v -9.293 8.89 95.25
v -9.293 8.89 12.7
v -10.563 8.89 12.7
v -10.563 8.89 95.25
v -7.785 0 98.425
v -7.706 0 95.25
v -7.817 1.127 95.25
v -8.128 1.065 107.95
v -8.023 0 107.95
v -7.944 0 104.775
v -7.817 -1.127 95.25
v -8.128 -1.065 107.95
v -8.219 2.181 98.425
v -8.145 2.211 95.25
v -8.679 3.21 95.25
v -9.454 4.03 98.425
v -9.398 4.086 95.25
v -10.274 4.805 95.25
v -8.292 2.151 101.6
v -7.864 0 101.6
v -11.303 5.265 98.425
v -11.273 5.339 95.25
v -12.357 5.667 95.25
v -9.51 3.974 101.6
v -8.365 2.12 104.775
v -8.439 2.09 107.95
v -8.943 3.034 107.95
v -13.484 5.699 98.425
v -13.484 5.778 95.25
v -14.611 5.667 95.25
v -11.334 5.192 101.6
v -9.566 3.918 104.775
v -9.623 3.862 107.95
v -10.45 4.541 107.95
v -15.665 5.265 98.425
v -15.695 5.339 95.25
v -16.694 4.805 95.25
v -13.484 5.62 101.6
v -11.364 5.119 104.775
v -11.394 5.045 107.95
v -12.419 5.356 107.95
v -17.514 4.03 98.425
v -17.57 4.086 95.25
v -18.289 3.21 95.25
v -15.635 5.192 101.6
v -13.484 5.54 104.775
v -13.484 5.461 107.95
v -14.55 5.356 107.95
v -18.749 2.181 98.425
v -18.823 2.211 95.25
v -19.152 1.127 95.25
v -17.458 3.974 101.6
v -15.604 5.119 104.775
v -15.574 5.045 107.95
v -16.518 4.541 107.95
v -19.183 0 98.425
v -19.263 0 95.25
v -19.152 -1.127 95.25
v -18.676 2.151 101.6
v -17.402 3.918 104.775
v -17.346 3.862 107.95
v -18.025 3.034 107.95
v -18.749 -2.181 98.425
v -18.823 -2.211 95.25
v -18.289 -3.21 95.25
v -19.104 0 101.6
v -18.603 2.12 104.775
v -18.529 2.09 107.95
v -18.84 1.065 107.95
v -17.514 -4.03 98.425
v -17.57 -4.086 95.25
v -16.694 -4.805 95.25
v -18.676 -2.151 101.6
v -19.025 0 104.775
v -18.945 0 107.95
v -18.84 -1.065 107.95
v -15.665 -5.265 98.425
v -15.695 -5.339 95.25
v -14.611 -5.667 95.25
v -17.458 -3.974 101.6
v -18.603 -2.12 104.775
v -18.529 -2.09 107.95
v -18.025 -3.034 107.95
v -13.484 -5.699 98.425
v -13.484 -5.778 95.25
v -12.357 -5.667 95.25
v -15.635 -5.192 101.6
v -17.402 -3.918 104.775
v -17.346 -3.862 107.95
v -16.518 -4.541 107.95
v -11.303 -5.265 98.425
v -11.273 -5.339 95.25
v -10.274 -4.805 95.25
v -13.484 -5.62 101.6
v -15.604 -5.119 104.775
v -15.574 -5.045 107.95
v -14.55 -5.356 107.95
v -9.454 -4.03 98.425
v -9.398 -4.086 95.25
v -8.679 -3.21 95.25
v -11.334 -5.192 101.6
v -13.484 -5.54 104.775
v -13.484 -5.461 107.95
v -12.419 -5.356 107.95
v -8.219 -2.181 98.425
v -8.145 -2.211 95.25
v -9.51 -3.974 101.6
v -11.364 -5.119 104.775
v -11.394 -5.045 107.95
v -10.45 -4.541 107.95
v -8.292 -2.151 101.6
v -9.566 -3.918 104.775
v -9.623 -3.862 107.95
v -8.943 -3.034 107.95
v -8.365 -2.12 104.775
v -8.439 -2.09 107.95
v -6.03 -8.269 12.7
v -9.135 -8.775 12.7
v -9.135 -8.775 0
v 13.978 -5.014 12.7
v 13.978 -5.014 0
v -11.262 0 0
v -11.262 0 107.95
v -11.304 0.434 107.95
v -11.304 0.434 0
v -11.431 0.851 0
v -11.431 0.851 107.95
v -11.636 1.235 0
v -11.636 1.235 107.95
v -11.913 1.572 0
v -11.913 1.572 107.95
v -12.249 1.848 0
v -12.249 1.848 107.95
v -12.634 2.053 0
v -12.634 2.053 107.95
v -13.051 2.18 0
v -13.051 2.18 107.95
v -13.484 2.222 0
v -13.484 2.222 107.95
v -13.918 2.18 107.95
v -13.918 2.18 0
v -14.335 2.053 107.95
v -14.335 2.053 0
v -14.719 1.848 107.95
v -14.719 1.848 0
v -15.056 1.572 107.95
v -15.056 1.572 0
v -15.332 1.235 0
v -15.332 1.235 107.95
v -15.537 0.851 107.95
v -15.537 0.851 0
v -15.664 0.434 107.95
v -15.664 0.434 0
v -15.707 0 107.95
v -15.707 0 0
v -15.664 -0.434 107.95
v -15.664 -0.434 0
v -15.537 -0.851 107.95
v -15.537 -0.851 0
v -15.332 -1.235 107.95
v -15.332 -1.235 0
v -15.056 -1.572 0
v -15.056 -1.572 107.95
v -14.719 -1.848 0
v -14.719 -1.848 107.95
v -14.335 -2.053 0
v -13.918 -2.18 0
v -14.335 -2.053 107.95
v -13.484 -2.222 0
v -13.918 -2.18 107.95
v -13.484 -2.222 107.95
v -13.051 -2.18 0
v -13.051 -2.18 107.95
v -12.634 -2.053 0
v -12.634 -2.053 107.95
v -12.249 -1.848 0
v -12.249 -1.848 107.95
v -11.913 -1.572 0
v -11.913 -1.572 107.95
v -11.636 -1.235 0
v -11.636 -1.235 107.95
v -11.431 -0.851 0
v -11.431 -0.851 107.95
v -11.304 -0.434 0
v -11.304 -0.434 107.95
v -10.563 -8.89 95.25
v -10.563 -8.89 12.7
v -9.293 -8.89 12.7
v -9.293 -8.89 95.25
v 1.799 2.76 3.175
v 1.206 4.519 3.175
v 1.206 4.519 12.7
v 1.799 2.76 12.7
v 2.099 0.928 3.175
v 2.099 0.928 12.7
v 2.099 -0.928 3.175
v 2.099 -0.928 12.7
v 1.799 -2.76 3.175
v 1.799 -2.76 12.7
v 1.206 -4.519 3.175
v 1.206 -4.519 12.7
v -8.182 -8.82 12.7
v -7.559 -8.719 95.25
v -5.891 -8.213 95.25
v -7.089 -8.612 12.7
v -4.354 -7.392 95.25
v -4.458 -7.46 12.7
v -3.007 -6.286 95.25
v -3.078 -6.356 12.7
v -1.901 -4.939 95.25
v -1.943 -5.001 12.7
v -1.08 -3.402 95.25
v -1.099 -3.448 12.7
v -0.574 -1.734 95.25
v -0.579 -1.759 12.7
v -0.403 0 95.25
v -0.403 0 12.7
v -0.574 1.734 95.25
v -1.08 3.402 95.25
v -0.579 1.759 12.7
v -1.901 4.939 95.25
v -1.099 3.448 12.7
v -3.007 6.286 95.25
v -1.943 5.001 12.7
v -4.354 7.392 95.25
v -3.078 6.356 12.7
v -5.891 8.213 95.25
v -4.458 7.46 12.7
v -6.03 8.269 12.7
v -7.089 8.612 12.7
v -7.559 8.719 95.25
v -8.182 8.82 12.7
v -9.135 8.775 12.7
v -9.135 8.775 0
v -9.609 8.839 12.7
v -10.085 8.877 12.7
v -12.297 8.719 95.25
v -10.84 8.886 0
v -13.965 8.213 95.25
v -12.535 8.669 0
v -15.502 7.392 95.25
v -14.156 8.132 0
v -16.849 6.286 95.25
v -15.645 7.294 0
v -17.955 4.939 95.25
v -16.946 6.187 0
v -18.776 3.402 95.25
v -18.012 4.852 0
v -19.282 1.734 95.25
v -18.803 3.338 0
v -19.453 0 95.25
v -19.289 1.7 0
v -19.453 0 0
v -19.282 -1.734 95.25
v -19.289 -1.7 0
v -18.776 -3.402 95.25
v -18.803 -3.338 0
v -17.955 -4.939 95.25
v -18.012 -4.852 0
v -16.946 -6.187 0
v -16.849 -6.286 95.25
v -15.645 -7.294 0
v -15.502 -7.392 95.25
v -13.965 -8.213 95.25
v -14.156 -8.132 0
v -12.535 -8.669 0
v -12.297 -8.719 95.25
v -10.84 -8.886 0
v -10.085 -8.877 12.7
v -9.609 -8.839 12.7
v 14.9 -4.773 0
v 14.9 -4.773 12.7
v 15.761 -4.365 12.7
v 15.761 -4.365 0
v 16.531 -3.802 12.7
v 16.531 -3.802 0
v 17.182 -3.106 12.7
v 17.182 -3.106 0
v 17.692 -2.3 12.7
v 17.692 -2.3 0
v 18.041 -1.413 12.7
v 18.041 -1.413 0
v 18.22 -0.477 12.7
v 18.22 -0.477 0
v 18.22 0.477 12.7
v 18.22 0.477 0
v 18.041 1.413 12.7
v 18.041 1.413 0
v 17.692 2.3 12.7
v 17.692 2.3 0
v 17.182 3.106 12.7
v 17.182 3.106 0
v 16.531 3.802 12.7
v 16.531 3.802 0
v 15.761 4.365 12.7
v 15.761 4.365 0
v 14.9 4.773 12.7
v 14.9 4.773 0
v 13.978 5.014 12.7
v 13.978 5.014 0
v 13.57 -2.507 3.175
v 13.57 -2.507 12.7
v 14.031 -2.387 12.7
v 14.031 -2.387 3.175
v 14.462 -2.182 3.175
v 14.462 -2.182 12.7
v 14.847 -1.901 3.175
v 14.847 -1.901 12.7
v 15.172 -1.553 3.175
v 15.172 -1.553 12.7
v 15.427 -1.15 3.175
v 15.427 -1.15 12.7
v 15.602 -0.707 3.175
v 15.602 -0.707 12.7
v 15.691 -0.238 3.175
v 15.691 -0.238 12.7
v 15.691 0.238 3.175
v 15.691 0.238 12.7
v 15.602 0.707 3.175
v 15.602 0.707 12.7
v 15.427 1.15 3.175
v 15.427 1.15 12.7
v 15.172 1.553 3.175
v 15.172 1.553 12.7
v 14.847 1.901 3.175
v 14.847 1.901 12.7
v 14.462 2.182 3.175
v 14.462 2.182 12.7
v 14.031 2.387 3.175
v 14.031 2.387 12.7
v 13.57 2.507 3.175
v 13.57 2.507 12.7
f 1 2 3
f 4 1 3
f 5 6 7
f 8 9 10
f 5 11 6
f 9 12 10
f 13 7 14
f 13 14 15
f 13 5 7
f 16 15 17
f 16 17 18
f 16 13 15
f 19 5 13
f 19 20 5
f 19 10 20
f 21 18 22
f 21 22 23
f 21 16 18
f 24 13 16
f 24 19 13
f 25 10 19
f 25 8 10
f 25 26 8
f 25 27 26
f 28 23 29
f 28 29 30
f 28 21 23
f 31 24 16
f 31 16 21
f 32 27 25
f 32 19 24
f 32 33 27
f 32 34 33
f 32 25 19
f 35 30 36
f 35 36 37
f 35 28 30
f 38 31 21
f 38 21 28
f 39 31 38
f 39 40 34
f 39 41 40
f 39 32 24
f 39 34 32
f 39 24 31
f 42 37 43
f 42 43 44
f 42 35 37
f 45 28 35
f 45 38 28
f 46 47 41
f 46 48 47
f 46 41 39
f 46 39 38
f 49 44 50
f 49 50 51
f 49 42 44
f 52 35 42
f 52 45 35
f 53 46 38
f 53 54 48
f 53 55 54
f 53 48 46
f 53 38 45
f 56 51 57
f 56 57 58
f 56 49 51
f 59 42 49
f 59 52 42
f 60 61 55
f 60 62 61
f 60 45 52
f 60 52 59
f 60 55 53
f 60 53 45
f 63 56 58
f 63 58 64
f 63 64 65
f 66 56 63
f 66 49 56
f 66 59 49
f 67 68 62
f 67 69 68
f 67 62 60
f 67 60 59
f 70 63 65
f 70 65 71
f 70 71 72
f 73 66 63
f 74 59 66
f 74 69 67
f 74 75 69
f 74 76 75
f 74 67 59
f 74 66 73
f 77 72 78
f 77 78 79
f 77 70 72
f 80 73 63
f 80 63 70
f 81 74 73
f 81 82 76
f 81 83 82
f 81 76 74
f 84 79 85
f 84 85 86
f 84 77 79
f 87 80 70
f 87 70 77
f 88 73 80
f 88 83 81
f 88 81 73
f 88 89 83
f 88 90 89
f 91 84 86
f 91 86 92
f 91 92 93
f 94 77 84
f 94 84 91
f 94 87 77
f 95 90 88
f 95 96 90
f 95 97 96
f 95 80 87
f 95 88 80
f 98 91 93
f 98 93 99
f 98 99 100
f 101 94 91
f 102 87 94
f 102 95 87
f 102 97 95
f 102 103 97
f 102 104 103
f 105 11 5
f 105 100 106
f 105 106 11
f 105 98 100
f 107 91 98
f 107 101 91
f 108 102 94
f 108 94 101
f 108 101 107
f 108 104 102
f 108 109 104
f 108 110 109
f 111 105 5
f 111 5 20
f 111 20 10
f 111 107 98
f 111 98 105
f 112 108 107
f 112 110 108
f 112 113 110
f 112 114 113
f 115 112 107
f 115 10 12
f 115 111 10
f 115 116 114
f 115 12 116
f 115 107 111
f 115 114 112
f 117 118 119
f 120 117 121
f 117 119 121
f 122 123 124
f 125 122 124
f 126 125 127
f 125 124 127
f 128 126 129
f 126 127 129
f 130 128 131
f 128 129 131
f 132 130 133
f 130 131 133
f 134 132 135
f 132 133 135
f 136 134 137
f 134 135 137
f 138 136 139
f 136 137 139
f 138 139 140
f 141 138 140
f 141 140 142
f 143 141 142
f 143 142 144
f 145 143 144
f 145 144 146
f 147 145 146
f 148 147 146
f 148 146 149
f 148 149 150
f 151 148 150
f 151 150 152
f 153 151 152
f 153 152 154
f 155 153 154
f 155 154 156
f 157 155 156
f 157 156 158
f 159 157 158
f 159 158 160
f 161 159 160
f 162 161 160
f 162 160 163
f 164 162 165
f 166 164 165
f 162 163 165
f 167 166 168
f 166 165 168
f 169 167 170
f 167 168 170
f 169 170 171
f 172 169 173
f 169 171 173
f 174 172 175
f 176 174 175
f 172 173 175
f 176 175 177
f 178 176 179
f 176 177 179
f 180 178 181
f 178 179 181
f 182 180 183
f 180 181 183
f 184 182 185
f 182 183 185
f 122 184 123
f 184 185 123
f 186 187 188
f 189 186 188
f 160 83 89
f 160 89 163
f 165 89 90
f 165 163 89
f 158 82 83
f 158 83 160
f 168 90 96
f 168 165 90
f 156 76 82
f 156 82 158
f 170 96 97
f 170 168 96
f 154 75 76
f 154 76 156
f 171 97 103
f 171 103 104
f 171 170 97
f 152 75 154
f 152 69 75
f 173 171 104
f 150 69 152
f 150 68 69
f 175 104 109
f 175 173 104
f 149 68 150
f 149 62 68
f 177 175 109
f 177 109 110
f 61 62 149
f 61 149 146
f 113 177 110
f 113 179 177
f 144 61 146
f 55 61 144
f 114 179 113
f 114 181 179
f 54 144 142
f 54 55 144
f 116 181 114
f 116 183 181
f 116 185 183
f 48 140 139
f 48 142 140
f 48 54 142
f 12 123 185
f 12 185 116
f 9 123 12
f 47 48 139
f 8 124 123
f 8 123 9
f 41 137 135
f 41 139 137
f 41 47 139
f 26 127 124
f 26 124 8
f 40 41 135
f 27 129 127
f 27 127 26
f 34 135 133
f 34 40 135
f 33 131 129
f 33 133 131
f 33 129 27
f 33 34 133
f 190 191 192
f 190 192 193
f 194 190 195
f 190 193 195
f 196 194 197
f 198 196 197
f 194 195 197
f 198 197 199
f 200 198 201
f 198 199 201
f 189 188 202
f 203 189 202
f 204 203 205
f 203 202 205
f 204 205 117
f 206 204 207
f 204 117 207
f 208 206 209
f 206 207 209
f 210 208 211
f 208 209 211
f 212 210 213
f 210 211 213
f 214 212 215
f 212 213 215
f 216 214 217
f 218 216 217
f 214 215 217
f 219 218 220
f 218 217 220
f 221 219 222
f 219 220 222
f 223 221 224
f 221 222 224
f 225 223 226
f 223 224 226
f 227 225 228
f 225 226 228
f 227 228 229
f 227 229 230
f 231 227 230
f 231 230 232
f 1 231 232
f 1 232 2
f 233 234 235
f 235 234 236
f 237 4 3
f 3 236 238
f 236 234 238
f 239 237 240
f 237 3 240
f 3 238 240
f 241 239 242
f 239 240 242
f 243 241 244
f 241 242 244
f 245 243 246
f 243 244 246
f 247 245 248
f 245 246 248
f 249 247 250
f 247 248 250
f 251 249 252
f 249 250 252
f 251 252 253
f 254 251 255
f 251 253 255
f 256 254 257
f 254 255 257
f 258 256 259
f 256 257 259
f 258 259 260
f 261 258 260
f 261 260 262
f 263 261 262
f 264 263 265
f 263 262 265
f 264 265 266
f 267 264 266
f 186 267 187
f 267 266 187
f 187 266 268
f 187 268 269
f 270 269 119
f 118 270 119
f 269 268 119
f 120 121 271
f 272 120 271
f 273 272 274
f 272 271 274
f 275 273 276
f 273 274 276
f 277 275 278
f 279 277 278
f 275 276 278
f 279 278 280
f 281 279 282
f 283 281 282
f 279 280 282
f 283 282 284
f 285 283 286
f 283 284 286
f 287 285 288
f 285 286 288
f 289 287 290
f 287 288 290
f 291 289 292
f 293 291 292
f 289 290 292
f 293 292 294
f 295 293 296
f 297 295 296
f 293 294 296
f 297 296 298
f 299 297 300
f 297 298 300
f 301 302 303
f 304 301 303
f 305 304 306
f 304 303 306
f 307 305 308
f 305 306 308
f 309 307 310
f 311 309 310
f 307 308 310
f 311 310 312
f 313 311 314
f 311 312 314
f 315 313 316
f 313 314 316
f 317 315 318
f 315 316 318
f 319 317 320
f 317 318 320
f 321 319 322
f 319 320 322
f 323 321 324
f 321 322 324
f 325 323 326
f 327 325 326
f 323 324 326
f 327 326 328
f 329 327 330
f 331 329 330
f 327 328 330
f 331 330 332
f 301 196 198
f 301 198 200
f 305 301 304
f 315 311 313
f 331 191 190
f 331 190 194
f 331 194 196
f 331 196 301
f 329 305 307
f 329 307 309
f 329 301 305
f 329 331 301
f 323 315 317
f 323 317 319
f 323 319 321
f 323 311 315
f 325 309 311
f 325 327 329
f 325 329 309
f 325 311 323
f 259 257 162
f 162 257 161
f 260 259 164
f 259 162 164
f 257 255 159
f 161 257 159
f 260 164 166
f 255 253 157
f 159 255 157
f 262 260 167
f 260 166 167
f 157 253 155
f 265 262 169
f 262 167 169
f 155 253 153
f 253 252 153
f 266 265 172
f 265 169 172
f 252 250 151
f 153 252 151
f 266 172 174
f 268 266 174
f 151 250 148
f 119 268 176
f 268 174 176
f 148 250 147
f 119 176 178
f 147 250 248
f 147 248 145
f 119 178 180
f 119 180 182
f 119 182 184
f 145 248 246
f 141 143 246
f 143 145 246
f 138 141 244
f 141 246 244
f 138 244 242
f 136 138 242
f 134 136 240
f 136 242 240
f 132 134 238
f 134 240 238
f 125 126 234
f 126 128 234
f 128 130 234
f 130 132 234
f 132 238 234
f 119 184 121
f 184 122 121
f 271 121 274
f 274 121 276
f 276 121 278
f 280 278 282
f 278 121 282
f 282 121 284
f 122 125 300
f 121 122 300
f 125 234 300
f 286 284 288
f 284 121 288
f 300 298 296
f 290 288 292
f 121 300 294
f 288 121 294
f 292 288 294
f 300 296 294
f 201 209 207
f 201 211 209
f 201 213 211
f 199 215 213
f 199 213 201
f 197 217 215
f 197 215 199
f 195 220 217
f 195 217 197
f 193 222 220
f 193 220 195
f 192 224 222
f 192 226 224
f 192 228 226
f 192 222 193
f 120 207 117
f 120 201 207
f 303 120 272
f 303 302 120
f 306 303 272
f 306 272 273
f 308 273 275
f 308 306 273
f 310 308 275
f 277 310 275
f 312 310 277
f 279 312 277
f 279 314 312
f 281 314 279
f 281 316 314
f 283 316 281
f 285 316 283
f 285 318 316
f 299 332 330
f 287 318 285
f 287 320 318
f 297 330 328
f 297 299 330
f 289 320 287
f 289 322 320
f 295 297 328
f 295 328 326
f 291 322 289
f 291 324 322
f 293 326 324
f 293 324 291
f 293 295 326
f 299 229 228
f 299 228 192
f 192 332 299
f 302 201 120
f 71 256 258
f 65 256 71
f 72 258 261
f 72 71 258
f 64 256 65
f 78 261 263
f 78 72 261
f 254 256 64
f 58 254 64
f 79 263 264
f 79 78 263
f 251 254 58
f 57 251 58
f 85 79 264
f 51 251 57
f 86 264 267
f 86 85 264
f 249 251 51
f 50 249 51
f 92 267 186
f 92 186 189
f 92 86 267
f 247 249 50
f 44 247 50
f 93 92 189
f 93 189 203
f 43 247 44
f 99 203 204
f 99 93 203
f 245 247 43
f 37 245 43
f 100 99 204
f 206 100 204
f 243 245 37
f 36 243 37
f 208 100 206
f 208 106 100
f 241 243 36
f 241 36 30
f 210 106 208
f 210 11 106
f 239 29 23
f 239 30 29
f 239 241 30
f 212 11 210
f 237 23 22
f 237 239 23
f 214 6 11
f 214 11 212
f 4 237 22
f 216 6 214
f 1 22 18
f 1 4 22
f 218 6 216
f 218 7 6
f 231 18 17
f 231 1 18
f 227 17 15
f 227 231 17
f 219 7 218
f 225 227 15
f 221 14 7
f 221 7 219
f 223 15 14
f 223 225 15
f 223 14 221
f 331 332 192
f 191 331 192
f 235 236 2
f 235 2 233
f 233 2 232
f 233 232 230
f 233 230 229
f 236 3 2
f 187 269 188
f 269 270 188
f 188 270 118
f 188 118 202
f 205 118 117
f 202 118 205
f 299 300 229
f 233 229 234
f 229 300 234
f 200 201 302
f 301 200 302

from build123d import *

# Parameters (mm, degrees)
F1_DEPTH  = 12.7
F3_DEPTH  = 82.55
F7_R      = 2.2225
F8_DEPTH  = 107.951
F10_DEPTH = 9.525


with BuildPart() as f1:
    # F0 (on Top) → F1 (new body)
    with BuildSketch(Plane.XY):
        with BuildLine():
            Line((13.9777885884, 5.014068319), (-9.1354904962, 8.7746195582))
            ThreePointArc((-9.1354904962, 8.7746195582), (-19.453128969, 0), (-9.1354904962, -8.7746195582))
            Line((-9.1354904962, -8.7746195582), (13.9777885884, -5.014068319))
            ThreePointArc((13.9777885884, -5.014068319), (18.2419951753, 0), (13.9777885884, 5.014068319))
        make_face()
    extrude(amount=F1_DEPTH)

    # F2 (on face) → F3 (join)
    with BuildSketch(Plane.XY.offset(12.7)):
        with BuildLine():
            Line((-9.293128969, 8.89), (-10.563128969, 8.89))
            ThreePointArc((-10.563128969, 8.89), (-19.453128969, 0), (-10.563128969, -8.89))
            Line((-10.563128969, -8.89), (-9.293128969, -8.89))
            ThreePointArc((-9.293128969, -8.89), (-0.403128969, 0), (-9.293128969, 8.89))
        make_face()
    extrude(amount=F3_DEPTH)

    # F5 (on Front) → F6 (revolve)
    with BuildSketch(Plane.XZ):
        Polygon((-13.484128969, 95.25), (-7.705628969, 95.25), (-8.023128969, 107.95), (-13.484128969, 107.95), align=None)
    revolve(axis=Axis((-13.484128969, 0, 63.5), (0, 0, 1)))

    # F7 (on face) → F8 (cut, through all)
    with BuildSketch(Plane.XY.offset(107.95)):
        with Locations((-13.484128969, 0)):
            Circle(F7_R)
    extrude(amount=-F8_DEPTH, mode=Mode.SUBTRACT)

    # F9 (on face) → F10 (cut)
    with BuildSketch(Plane.XY.offset(12.7)):
        with BuildLine():
            Line((13.5698918818, 2.5070341595), (1.2057433852, 4.5186922103))
            ThreePointArc((1.2057433852, 4.5186922103), (2.136871031, 0), (1.2057433852, -4.5186922103))
            Line((1.2057433852, -4.5186922103), (13.5698918818, -2.5070341595))
            ThreePointArc((13.5698918818, -2.5070341595), (15.7019951753, 0), (13.5698918818, 2.5070341595))
        make_face()
    extrude(amount=-F10_DEPTH, mode=Mode.SUBTRACT)


solid = f1.part
